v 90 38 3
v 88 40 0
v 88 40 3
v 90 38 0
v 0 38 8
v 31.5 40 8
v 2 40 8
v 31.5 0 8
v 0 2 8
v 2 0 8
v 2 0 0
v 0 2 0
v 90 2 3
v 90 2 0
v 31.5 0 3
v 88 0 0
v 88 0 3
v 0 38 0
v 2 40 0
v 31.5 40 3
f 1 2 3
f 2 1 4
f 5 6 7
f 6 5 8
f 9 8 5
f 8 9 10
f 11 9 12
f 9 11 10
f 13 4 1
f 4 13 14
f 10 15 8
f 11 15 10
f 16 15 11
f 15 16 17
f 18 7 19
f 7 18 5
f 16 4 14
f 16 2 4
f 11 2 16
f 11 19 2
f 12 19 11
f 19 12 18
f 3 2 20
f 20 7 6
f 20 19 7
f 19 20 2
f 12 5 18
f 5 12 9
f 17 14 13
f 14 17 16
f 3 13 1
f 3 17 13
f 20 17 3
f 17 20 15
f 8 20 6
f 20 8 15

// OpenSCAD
$fn = 32;

// ----------------------------------------------------------------------
// Stepped bar: endstep, 90 x 40 x 8/3 mm
// ----------------------------------------------------------------------

// --- parameters (mm) ---
bar_l = 90;               // bar length, X
bar_w = 40;               // bar width, Y
plate_t = 8;              // thickness of the thick zone, Z
thin_t = 3;               // thickness of the thin zone
corner_c = 2;             // corner chamfer of the bar
step_cut = 5;             // material removed from the thin zone
step_x = 31.5;            // step position from the left end
depth_1 = 5;              // depth of cut 1 from the top face

profile = [[2, 0], [88, 0], [90, 2], [90, 38], [88, 40], [2, 40], [0, 38], [0, 2]];  // primary outline, 8 points, counter clockwise
void_1 = [[31.5, -1], [91, -1], [91, 41], [31.5, 41]];  // thin zone beyond the step, 4 points

// --- the one profile operation ---
difference() {
  linear_extrude(height = plate_t) polygon(points = profile);
  translate([0, 0, plate_t - depth_1])
    linear_extrude(height = depth_1 + 1) polygon(points = void_1);
}
